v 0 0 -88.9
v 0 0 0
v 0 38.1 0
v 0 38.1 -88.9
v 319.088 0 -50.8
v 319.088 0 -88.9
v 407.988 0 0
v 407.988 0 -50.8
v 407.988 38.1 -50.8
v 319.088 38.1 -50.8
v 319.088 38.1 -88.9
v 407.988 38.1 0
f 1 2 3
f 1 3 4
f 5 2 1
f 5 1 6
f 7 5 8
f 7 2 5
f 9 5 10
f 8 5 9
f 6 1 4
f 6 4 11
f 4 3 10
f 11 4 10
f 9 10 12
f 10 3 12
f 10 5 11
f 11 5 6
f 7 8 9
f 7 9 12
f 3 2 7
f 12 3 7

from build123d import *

# Parameters (mm, degrees)
SKETCH1_W           = 319.0875
SKETCH1_H           = 88.9
BOSS_EXTRUDE1_DEPTH = 38.1
SKETCH2_W           = 88.9
SKETCH2_H           = 50.8
BOSS_EXTRUDE2_DEPTH = 38.1


with BuildPart() as part:
    # Sketch1 → Boss-Extrude1 (new body)
    with BuildSketch(Plane(origin=(0, 0, 0), x_dir=(1, 0, 0), z_dir=(0, 1, 0))):
        with Locations((159.54375, 44.45)):
            Rectangle(SKETCH1_W, SKETCH1_H)
    extrude(amount=BOSS_EXTRUDE1_DEPTH)

    # Sketch2 → Boss-Extrude2 (add, through all)
    with BuildSketch(Plane.XZ):
        with Locations((363.5375, -25.4)):
            Rectangle(SKETCH2_W, SKETCH2_H)
    extrude(amount=-BOSS_EXTRUDE2_DEPTH)


solid = part.part
